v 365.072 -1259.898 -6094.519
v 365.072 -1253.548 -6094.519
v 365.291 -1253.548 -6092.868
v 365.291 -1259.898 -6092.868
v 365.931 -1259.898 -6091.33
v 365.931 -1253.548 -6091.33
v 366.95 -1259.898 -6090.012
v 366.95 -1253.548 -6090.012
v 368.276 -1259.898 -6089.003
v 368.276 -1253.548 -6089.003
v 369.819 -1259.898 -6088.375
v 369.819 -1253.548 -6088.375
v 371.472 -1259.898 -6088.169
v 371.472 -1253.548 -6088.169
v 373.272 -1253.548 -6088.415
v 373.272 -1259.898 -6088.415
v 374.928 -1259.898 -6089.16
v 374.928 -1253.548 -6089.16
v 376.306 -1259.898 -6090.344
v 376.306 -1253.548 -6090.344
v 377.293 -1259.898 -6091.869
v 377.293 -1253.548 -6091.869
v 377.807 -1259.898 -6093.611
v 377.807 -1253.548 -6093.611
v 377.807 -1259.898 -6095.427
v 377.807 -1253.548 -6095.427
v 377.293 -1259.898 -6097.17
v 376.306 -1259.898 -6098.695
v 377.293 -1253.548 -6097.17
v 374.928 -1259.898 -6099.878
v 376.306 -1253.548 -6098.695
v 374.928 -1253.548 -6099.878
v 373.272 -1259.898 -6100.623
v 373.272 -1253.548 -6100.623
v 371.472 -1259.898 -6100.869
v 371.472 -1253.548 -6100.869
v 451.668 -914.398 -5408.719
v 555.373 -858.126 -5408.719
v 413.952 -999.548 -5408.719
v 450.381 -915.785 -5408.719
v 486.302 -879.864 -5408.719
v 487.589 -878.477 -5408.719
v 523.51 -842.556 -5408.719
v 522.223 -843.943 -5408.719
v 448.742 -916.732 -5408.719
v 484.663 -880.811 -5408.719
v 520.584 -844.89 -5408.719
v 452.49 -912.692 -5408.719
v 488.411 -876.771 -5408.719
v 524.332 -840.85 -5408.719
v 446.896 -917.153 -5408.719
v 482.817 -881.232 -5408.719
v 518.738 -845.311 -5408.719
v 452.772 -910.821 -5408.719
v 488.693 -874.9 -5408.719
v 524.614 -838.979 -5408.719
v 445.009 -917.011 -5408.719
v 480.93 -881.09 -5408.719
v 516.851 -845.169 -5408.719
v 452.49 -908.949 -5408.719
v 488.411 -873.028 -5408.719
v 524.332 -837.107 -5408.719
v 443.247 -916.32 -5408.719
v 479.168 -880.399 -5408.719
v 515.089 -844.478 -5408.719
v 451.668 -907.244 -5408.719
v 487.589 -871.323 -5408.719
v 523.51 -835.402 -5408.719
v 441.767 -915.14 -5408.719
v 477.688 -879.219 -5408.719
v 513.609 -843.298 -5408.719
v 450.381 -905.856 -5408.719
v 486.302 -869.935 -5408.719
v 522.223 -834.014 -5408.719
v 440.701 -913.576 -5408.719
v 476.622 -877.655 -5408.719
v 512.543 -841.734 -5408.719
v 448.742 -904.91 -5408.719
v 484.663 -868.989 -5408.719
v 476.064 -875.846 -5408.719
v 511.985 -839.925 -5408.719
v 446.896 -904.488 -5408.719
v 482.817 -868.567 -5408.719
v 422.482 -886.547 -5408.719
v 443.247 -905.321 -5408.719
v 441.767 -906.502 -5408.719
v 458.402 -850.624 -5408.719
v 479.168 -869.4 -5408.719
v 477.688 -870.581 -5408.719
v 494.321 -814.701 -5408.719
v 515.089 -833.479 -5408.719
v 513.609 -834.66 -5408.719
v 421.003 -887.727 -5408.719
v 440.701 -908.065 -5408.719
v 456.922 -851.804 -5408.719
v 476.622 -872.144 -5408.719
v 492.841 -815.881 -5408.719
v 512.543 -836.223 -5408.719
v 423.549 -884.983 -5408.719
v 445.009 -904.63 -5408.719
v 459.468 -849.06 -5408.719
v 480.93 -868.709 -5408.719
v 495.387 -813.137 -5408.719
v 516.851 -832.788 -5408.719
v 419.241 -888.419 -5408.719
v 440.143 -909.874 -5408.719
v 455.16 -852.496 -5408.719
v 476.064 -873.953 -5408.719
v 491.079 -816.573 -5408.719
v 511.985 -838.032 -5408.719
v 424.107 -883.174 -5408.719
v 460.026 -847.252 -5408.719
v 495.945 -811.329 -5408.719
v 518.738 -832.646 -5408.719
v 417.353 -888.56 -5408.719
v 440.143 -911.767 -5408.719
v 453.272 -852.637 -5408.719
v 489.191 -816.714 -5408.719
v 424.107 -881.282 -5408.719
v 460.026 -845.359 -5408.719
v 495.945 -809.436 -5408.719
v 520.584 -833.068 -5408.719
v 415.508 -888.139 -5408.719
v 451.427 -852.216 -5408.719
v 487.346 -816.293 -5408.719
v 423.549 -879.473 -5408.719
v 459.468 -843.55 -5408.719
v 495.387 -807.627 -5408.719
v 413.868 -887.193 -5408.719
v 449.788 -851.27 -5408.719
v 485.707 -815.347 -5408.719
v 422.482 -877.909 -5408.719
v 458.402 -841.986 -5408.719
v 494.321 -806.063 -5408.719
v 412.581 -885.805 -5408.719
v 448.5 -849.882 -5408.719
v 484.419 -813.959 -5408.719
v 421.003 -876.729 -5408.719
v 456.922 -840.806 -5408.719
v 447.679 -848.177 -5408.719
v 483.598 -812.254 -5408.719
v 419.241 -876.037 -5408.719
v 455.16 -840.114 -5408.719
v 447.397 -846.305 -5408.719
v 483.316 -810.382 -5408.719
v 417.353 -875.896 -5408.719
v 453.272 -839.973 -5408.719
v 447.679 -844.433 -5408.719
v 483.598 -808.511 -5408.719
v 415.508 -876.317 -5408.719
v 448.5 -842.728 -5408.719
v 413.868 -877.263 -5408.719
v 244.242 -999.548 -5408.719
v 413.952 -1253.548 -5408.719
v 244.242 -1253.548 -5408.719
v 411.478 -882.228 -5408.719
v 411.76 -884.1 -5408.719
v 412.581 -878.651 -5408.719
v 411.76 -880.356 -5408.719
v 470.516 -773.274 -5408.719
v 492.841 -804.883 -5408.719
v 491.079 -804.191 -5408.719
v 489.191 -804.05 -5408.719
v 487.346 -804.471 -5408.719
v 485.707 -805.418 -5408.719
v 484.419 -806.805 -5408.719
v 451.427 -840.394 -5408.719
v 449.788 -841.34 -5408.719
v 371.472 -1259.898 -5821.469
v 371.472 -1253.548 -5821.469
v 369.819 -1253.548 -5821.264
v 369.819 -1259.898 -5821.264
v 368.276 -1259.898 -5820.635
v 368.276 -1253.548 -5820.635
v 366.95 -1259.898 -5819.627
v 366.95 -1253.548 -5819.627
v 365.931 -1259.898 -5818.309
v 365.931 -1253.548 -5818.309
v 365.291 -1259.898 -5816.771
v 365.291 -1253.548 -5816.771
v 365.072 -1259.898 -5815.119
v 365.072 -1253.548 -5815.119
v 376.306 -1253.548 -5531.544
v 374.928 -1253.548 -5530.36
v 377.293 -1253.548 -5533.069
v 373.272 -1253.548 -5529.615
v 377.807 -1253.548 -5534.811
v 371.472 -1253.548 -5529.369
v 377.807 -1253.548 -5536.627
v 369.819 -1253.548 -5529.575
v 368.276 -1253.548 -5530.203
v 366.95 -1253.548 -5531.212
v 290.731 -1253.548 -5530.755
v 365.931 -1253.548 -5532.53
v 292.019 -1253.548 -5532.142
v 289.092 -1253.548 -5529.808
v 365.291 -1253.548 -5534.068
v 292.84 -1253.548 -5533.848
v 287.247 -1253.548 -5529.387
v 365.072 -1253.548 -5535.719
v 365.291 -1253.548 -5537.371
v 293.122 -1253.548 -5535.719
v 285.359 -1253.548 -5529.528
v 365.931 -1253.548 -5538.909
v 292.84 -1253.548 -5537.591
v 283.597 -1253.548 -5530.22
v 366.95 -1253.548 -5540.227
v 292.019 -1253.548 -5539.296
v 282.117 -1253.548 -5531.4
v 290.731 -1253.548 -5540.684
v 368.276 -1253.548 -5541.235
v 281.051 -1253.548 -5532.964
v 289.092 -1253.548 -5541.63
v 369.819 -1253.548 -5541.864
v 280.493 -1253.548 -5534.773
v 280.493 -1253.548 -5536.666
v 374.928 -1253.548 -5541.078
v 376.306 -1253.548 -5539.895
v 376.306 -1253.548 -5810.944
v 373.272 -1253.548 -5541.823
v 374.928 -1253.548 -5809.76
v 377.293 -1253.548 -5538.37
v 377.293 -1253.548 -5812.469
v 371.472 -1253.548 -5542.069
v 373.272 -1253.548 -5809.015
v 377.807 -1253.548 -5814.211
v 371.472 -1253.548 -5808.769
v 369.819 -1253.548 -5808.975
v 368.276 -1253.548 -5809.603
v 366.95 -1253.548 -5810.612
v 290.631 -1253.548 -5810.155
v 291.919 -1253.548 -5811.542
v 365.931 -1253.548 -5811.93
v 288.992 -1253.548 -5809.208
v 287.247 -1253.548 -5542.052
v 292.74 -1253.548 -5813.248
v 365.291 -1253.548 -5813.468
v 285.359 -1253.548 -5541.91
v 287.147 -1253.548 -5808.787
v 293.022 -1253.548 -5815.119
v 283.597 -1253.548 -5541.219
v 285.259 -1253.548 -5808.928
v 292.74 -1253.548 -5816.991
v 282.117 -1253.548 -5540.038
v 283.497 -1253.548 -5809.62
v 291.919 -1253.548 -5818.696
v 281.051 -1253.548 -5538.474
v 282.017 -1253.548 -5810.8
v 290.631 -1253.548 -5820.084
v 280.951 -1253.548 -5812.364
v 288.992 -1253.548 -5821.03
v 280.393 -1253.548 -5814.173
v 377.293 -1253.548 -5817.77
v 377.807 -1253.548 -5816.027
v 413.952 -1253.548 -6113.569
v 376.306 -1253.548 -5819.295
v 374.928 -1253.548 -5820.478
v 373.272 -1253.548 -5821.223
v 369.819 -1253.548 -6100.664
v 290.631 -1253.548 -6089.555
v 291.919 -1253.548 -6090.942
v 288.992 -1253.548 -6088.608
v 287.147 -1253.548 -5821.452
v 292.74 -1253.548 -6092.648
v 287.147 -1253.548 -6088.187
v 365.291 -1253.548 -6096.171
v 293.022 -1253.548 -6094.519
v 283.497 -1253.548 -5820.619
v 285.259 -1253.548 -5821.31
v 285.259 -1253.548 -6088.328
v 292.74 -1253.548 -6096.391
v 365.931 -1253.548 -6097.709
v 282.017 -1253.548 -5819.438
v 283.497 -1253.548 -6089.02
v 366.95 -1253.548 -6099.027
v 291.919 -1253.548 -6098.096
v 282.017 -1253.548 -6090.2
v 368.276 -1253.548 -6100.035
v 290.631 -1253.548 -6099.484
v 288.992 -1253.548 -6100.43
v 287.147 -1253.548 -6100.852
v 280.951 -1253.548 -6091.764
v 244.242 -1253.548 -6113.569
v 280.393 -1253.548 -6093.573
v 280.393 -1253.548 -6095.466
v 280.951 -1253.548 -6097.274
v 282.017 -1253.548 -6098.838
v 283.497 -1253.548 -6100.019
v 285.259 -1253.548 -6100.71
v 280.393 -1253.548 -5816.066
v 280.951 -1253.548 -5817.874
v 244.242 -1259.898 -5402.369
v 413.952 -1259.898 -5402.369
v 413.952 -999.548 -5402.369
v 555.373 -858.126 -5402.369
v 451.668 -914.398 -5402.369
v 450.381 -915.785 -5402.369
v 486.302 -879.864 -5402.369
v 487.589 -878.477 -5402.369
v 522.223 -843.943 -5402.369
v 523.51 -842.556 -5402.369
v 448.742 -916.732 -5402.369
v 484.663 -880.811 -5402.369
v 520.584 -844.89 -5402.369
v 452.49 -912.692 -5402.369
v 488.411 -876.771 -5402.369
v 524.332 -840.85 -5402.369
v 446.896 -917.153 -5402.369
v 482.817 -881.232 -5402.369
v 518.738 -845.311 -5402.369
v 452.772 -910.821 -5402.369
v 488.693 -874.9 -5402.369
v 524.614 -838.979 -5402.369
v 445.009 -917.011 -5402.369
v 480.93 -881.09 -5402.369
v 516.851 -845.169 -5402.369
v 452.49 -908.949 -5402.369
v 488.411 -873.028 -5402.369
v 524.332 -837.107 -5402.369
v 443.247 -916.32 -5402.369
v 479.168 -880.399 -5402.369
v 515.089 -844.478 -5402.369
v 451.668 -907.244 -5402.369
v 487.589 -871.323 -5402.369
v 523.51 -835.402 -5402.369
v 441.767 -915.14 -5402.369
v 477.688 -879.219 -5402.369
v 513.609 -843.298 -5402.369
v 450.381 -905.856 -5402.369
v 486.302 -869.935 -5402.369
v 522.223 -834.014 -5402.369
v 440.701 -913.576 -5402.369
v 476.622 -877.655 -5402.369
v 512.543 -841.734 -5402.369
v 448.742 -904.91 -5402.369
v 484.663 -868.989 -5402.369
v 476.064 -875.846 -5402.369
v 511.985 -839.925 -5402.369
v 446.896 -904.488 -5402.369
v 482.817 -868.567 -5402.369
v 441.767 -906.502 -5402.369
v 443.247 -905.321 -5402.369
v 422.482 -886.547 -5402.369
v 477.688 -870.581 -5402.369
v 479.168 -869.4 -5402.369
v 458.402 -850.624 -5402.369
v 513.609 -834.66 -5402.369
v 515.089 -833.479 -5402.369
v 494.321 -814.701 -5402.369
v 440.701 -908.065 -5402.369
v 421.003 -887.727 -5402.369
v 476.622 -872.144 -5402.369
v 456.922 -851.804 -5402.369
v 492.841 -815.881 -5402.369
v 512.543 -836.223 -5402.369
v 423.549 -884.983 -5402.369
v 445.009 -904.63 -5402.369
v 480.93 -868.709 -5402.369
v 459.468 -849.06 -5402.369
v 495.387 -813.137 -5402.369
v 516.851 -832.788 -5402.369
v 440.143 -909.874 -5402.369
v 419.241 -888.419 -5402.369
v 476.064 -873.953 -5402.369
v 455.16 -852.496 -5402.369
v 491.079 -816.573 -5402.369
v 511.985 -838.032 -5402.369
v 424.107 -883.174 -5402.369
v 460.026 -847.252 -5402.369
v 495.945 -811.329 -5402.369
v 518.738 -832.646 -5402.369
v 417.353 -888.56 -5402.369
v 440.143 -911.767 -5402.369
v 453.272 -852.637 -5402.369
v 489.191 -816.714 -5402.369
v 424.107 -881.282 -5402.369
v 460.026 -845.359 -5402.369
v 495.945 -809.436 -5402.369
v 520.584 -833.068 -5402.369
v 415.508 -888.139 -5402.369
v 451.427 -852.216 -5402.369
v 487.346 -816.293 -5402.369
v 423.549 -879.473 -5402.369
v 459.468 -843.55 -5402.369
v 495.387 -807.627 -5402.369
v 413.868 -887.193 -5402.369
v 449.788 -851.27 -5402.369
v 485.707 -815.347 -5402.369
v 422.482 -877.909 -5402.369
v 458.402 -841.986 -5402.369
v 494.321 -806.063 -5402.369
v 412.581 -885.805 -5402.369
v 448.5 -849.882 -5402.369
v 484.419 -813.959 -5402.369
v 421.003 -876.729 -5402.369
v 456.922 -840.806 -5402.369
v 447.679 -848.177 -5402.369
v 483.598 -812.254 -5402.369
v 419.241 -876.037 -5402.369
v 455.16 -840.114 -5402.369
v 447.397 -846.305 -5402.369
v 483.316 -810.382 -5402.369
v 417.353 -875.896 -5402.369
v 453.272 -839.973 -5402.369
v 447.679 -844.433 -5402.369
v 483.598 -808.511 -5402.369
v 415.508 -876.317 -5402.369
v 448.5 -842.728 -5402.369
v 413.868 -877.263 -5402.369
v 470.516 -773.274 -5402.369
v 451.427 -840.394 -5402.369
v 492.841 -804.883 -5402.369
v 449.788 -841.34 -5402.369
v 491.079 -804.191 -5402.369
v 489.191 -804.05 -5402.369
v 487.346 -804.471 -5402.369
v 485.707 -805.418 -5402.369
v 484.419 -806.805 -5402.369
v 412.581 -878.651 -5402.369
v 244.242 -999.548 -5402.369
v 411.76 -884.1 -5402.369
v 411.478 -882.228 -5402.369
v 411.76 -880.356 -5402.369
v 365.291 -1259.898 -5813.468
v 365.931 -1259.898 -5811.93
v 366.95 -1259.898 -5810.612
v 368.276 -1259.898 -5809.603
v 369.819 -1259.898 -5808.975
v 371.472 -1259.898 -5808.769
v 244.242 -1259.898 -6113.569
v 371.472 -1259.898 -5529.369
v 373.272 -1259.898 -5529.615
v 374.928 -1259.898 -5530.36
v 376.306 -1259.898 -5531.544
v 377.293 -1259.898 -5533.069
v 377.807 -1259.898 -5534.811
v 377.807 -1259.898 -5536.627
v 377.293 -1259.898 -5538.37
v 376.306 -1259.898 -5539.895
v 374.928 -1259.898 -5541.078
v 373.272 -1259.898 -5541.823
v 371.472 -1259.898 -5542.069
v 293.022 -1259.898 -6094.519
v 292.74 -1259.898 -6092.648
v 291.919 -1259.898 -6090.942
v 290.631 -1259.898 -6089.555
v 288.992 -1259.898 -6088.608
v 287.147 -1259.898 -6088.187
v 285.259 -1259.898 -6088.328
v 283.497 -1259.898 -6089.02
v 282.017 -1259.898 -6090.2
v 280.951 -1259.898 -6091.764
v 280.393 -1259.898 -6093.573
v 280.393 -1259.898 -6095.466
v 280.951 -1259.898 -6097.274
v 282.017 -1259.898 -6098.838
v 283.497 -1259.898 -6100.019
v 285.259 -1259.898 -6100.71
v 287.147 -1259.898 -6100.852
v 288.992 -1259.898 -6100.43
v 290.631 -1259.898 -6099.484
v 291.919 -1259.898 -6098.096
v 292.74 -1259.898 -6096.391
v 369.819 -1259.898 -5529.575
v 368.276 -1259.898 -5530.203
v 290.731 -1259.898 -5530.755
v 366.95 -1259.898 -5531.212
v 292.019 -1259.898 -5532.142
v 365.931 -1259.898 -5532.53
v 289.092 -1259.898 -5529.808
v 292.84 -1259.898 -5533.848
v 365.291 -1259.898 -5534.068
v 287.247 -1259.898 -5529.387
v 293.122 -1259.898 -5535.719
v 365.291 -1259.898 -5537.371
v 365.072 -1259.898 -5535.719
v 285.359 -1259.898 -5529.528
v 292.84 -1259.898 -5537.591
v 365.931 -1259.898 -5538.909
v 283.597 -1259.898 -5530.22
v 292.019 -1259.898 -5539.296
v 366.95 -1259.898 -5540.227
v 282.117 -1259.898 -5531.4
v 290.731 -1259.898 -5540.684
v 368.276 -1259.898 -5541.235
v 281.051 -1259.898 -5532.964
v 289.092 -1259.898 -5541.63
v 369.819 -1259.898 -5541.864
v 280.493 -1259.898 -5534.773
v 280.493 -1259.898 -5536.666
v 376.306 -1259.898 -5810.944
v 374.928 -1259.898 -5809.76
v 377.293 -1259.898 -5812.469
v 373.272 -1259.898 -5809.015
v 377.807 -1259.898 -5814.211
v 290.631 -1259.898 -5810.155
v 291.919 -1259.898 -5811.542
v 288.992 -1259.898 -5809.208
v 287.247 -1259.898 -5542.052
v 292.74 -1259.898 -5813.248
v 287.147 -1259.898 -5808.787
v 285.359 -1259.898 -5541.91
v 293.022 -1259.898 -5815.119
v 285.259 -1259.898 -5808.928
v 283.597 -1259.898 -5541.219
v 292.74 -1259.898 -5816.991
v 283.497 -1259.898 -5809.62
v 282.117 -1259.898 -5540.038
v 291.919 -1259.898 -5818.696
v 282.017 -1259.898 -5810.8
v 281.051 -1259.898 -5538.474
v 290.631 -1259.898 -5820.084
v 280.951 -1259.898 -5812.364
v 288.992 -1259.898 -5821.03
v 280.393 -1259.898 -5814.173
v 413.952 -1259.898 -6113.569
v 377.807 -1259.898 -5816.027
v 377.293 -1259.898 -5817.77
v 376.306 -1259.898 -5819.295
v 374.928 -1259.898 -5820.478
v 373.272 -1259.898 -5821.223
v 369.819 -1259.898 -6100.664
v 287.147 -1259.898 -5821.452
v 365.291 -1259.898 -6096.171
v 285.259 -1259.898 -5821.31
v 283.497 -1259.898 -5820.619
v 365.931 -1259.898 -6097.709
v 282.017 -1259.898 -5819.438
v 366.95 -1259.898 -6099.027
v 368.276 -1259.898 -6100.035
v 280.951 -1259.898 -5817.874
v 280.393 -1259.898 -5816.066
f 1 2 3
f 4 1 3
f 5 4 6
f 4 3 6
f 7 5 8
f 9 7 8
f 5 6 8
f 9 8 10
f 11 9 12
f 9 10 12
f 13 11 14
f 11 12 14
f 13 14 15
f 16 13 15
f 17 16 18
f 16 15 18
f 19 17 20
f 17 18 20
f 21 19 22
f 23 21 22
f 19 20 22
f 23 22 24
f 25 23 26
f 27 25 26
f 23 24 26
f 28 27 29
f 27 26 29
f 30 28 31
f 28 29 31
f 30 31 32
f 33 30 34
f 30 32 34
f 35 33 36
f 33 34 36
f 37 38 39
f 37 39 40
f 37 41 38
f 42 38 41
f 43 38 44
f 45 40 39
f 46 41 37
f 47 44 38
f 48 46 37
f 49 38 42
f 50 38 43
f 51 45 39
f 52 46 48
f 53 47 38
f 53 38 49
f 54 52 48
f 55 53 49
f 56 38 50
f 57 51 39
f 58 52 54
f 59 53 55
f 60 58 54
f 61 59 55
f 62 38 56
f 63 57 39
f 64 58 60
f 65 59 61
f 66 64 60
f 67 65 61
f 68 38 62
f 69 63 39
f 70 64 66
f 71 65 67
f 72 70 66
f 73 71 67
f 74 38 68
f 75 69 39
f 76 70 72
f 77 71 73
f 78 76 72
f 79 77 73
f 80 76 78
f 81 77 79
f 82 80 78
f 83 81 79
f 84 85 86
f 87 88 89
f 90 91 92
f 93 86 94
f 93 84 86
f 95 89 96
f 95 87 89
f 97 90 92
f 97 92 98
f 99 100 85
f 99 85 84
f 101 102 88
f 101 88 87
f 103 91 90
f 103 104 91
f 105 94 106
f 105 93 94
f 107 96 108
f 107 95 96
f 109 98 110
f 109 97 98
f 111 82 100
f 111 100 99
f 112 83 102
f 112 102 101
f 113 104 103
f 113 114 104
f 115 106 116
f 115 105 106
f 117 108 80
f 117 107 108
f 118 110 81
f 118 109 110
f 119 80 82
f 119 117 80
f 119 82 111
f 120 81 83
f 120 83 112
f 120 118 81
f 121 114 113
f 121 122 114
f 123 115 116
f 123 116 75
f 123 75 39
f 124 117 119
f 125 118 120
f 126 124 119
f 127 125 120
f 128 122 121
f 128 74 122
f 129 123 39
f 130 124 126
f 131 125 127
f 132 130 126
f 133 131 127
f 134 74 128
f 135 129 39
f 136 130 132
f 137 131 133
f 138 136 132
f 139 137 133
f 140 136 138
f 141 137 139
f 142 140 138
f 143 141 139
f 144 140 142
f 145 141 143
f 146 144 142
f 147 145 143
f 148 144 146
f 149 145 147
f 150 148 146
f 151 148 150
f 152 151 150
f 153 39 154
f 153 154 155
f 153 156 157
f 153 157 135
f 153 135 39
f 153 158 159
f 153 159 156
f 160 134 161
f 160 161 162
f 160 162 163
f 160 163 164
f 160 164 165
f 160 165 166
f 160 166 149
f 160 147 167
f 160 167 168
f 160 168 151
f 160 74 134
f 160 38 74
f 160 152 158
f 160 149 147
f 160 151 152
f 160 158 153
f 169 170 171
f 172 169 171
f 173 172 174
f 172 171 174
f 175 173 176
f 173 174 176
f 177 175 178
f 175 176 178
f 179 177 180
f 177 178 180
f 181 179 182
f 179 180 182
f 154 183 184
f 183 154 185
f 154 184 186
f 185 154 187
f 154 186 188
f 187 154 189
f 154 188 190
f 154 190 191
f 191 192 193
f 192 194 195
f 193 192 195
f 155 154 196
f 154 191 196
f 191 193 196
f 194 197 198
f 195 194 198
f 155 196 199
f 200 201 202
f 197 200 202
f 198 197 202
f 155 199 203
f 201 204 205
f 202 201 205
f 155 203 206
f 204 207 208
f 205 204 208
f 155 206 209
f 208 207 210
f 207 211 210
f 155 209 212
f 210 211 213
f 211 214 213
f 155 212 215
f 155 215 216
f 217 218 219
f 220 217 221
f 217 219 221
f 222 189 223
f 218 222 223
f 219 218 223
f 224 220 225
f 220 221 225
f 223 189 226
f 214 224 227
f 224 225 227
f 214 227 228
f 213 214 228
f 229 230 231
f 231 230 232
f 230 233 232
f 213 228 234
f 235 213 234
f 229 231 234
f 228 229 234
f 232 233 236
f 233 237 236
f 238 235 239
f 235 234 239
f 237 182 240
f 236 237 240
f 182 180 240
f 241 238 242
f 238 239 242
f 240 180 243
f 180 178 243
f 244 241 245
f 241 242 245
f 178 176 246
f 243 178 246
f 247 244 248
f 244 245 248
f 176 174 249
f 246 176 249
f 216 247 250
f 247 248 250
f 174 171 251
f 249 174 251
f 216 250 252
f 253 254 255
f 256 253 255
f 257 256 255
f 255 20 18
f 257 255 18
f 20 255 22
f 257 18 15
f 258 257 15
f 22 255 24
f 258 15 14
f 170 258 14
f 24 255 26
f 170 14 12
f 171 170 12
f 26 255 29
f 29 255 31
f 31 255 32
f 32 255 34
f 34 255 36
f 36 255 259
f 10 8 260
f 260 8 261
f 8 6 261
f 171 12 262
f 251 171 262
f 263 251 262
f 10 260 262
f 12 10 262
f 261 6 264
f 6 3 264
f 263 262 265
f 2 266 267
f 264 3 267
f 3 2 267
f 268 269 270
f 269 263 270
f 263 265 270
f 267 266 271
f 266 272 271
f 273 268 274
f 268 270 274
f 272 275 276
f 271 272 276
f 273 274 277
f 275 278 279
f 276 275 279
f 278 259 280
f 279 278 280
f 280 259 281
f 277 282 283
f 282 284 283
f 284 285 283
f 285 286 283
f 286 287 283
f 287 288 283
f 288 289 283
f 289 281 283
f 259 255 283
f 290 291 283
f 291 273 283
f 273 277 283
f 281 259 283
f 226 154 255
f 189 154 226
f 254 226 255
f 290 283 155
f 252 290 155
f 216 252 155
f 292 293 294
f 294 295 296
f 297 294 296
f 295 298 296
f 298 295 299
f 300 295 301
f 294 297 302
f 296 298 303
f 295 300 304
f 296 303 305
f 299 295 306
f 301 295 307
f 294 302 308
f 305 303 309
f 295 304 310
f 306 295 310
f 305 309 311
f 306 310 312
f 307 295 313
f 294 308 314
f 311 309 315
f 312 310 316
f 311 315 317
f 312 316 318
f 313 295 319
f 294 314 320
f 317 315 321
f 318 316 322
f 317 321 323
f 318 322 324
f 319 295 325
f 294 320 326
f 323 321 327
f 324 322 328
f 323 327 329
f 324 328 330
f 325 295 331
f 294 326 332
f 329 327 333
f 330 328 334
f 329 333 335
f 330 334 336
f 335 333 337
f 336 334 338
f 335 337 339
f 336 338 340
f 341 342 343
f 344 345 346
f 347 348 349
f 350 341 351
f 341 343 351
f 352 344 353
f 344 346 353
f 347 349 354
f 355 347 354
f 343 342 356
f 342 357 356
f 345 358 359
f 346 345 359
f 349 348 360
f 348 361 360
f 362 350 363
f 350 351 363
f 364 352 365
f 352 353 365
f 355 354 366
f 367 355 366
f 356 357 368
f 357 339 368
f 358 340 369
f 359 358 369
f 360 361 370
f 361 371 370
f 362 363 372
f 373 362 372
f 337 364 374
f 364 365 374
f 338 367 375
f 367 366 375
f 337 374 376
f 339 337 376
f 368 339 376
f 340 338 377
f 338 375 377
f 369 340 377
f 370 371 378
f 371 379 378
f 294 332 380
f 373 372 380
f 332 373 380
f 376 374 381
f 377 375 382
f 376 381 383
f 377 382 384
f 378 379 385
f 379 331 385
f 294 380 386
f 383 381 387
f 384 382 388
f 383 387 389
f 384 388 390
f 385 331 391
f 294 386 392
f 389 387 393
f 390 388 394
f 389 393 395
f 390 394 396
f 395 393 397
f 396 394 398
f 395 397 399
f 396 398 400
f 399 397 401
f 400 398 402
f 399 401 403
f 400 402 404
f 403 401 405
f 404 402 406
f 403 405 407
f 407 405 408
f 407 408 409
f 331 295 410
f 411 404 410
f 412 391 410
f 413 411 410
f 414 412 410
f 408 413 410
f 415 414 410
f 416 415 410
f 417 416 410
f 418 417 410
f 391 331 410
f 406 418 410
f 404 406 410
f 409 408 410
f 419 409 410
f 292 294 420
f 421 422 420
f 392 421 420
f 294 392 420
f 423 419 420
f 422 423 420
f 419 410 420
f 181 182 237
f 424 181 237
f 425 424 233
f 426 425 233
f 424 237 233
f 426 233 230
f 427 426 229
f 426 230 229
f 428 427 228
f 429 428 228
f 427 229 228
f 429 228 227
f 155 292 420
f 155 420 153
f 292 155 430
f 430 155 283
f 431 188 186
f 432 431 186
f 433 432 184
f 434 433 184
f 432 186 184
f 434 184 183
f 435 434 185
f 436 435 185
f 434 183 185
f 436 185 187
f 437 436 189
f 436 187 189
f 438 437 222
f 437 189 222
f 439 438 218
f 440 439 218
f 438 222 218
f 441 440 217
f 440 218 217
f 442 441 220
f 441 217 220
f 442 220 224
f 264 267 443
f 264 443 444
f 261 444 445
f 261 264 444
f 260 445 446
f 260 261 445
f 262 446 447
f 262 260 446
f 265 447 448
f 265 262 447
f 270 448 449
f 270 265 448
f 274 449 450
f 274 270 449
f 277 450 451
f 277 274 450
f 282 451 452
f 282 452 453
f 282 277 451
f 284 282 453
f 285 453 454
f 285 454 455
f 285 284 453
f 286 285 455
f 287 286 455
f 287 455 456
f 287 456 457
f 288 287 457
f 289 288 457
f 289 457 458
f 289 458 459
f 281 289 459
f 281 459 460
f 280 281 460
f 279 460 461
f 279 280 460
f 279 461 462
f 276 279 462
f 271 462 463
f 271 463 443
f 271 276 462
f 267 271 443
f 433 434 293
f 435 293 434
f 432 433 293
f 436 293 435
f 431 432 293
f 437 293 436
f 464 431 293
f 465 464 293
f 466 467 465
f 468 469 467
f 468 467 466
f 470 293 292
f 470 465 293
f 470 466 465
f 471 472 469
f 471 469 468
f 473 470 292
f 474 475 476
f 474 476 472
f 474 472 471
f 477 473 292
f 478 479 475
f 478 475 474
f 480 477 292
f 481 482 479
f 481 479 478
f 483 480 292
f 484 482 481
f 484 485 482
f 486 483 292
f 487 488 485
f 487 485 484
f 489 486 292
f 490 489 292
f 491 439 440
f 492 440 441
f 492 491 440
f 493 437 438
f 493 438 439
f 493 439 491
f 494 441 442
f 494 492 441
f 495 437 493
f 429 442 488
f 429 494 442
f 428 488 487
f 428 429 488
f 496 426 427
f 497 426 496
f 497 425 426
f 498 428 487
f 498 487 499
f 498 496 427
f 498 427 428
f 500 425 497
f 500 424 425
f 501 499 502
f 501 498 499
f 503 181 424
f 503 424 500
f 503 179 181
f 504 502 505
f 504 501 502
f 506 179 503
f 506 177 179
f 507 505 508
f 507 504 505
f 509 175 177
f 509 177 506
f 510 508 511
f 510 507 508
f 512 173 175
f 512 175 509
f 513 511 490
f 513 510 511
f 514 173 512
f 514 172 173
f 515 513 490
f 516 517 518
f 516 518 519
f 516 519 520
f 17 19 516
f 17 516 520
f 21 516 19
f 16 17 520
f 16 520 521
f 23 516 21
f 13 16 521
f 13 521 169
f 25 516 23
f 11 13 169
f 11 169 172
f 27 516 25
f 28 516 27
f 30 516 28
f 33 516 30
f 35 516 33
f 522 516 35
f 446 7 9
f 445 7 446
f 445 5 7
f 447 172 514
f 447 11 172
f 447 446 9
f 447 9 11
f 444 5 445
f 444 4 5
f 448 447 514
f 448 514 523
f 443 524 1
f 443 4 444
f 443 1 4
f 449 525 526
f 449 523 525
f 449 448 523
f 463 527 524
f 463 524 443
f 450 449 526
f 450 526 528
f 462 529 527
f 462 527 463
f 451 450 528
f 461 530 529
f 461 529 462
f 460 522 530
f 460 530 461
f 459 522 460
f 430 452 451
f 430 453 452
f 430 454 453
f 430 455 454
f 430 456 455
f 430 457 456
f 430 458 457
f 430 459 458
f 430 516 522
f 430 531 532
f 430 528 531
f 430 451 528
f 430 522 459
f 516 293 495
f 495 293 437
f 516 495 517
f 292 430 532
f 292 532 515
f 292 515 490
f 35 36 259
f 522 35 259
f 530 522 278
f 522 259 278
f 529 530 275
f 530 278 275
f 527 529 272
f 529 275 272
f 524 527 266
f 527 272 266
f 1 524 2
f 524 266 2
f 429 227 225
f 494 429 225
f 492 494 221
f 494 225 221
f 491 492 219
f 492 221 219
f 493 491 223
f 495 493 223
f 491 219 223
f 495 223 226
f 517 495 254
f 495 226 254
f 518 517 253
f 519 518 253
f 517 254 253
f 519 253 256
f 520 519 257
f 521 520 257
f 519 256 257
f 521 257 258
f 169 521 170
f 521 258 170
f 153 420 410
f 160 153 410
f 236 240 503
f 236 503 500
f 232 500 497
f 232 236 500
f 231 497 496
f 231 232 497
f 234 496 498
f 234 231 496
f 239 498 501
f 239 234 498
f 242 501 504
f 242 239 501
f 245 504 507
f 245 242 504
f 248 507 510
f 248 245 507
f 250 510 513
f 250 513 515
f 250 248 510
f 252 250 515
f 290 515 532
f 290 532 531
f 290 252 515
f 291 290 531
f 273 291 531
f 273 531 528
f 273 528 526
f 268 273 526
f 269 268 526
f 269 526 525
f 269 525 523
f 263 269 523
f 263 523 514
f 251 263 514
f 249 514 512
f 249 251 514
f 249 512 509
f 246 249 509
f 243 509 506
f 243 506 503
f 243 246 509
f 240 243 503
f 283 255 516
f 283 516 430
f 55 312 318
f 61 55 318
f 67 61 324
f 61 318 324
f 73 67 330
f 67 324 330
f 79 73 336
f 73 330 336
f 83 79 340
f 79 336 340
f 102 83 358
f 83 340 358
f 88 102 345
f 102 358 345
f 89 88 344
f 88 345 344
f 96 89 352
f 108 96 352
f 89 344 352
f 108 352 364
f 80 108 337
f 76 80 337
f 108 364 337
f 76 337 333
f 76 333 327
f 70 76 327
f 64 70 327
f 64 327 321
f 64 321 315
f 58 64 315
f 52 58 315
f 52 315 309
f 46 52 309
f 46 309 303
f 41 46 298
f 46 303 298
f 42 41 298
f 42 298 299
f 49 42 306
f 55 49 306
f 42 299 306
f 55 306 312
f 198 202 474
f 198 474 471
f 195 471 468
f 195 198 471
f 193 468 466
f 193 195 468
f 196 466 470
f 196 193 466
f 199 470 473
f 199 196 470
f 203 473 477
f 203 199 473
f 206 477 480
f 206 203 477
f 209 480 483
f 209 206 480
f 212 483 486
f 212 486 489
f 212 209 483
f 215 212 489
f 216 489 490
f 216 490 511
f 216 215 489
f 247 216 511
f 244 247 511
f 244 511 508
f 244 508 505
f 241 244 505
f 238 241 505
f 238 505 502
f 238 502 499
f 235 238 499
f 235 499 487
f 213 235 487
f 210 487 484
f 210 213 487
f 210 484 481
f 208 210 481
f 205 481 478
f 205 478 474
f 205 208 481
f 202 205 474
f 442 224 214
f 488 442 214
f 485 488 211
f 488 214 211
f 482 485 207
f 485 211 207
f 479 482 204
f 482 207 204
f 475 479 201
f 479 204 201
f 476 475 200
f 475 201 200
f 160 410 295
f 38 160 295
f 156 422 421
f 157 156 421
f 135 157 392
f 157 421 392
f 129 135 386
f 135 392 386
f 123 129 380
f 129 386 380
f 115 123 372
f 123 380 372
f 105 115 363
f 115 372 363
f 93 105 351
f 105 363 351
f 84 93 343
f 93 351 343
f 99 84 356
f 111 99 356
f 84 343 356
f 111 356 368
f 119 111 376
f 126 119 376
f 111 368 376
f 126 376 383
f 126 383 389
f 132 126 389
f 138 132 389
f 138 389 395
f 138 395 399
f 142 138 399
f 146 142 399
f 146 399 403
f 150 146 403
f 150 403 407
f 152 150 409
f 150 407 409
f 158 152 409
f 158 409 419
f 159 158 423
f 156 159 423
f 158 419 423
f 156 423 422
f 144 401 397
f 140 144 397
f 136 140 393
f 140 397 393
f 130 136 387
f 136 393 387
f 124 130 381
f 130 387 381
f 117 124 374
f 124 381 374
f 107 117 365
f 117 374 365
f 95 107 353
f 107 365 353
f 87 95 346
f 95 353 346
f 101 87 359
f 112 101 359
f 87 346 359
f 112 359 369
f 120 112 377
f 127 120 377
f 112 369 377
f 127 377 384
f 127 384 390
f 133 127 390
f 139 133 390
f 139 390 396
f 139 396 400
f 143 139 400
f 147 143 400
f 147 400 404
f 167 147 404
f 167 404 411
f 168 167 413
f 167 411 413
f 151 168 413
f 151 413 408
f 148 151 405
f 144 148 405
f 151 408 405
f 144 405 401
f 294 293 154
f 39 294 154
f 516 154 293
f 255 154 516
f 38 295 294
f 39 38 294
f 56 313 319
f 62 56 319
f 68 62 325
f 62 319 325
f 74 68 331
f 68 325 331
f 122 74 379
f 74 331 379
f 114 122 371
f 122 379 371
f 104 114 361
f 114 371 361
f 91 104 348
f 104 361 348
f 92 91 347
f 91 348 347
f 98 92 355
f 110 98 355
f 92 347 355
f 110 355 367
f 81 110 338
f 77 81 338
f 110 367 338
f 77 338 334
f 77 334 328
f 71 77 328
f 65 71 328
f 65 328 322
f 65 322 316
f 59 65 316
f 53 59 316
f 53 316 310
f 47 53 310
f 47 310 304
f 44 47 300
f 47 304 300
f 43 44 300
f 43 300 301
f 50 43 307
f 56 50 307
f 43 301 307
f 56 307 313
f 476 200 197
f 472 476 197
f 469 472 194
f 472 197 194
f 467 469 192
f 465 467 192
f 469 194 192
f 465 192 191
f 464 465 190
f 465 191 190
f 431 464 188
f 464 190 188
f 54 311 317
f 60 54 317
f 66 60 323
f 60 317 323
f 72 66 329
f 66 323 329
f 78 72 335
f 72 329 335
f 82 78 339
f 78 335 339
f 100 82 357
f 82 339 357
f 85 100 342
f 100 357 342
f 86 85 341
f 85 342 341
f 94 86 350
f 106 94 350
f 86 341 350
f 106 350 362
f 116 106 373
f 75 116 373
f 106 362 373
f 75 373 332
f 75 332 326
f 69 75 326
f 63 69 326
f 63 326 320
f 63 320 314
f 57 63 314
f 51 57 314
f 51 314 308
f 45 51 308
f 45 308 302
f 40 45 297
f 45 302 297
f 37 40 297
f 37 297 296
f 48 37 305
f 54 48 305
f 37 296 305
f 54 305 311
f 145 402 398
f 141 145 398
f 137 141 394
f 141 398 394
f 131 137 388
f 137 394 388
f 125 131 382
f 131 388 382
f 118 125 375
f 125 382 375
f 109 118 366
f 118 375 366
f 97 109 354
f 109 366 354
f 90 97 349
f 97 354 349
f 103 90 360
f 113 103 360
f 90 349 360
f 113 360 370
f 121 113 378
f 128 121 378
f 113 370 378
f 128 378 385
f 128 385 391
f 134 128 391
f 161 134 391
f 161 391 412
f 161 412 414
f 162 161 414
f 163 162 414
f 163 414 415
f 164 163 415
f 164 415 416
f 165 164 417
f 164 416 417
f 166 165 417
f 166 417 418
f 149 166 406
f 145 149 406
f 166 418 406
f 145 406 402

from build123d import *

# Parameters (mm, degrees)
SKETCH1_R           = 161.29
BOSS_EXTRUDE1_DEPTH = 161.29
SKETCH3_W           = 4310.634
SKETCH3_H           = 18064.48
SKETCH3_R           = 161.29
BOSS_EXTRUDE3_DEPTH = 161.29
SCALE2_SCALE        = 0.039370079


with BuildPart() as part:
    # Sketch1 → Boss-Extrude1 (new body)
    with BuildSketch(Plane.XY):
        Polygon((-2155.317, 3225.8), (3592.046917484, 8973.163917484), (5747.419448428, 6817.902448428), (2155.317, 3225.8), (2155.317, -3225.8), (-2155.317, -3225.8), align=None)
        with Locations((4804.833357851, 7304.254711836)):
            Circle(SKETCH1_R, mode=Mode.SUBTRACT)
        with Locations((3892.43933595, 6391.860689935)):
            Circle(SKETCH1_R, mode=Mode.SUBTRACT)
        with Locations((2980.04531405, 5479.466668034)):
            Circle(SKETCH1_R, mode=Mode.SUBTRACT)
        with Locations(Location((2253.753739605, 6205.720818177, 0), (0, 0, 180))):
            Circle(SKETCH1_R, mode=Mode.SUBTRACT)
        with Locations(Location((3166.100745307, 7118.161853854, 0), (0, 0, 180))):
            Circle(SKETCH1_R, mode=Mode.SUBTRACT)
        with Locations(Location((4078.447751009, 8030.602889531, 0), (0, 0, 180))):
            Circle(SKETCH1_R, mode=Mode.SUBTRACT)
    extrude(amount=-BOSS_EXTRUDE1_DEPTH)

    # Sketch3 → Boss-Extrude3 (add)
    with BuildSketch(Plane(origin=(0, -3225.8, 0), x_dir=(-1, 0, 0), z_dir=(0, -1, 0))):
        with Locations((0, 9032.24)):
            Rectangle(SKETCH3_W, SKETCH3_H)
        with BuildLine():
            ThreePointArc((-1076.325000002, 3548.374999923), (-961.455647452, 3501.587385122), (-913.765000004, 3387.09))
            ThreePointArc((-913.765000004, 3387.09), (-961.455647452, 3272.592614878), (-1076.325000002, 3225.805000077))
            ThreePointArc((-1076.325000002, 3225.805000077), (-1238.885, 3387.09), (-1076.325000002, 3548.374999923))
        make_face(mode=Mode.SUBTRACT)
        with Locations(Location((1075.054999996, 3387.089999999, 0), (0, 0, 180))):
            Circle(SKETCH3_R, mode=Mode.SUBTRACT)
        with BuildLine():
            ThreePointArc((-1076.325000001, 10322.565000077), (-1238.885, 10483.85), (-1076.325, 10645.134999923))
            ThreePointArc((-1076.325, 10645.134999923), (-961.455647452, 10598.347385122), (-913.765000004, 10483.85))
            ThreePointArc((-913.765000004, 10483.85), (-961.455647452, 10369.352614878), (-1076.325000001, 10322.565000077))
        make_face(mode=Mode.SUBTRACT)
        with BuildLine():
            ThreePointArc((-1076.325000002, 17419.325000077), (-1238.885, 17580.61), (-1076.325000002, 17741.894999923))
            ThreePointArc((-1076.325000002, 17741.894999923), (-961.455647452, 17695.107385122), (-913.765000004, 17580.61))
            ThreePointArc((-913.765000004, 17580.61), (-961.455647452, 17466.112614878), (-1076.325000002, 17419.325000077))
        make_face(mode=Mode.SUBTRACT)
        with Locations(Location((1077.594999996, 10483.849999999, 0), (0, 0, 180))):
            Circle(SKETCH3_R, mode=Mode.SUBTRACT)
        with Locations(Location((1077.595, 17580.609999999, 0), (0, 0, 180))):
            Circle(SKETCH3_R, mode=Mode.SUBTRACT)
    extrude(amount=BOSS_EXTRUDE3_DEPTH)


with BuildPart() as part_1:
    # Scale2: scaled about (342.584657251, -1172.717670217, -5623.777851714)
    add(part.part.scale(SCALE2_SCALE).moved(Location((329.09707232, -1126.547683201, -5402.369274875))))


solid = part_1.part
